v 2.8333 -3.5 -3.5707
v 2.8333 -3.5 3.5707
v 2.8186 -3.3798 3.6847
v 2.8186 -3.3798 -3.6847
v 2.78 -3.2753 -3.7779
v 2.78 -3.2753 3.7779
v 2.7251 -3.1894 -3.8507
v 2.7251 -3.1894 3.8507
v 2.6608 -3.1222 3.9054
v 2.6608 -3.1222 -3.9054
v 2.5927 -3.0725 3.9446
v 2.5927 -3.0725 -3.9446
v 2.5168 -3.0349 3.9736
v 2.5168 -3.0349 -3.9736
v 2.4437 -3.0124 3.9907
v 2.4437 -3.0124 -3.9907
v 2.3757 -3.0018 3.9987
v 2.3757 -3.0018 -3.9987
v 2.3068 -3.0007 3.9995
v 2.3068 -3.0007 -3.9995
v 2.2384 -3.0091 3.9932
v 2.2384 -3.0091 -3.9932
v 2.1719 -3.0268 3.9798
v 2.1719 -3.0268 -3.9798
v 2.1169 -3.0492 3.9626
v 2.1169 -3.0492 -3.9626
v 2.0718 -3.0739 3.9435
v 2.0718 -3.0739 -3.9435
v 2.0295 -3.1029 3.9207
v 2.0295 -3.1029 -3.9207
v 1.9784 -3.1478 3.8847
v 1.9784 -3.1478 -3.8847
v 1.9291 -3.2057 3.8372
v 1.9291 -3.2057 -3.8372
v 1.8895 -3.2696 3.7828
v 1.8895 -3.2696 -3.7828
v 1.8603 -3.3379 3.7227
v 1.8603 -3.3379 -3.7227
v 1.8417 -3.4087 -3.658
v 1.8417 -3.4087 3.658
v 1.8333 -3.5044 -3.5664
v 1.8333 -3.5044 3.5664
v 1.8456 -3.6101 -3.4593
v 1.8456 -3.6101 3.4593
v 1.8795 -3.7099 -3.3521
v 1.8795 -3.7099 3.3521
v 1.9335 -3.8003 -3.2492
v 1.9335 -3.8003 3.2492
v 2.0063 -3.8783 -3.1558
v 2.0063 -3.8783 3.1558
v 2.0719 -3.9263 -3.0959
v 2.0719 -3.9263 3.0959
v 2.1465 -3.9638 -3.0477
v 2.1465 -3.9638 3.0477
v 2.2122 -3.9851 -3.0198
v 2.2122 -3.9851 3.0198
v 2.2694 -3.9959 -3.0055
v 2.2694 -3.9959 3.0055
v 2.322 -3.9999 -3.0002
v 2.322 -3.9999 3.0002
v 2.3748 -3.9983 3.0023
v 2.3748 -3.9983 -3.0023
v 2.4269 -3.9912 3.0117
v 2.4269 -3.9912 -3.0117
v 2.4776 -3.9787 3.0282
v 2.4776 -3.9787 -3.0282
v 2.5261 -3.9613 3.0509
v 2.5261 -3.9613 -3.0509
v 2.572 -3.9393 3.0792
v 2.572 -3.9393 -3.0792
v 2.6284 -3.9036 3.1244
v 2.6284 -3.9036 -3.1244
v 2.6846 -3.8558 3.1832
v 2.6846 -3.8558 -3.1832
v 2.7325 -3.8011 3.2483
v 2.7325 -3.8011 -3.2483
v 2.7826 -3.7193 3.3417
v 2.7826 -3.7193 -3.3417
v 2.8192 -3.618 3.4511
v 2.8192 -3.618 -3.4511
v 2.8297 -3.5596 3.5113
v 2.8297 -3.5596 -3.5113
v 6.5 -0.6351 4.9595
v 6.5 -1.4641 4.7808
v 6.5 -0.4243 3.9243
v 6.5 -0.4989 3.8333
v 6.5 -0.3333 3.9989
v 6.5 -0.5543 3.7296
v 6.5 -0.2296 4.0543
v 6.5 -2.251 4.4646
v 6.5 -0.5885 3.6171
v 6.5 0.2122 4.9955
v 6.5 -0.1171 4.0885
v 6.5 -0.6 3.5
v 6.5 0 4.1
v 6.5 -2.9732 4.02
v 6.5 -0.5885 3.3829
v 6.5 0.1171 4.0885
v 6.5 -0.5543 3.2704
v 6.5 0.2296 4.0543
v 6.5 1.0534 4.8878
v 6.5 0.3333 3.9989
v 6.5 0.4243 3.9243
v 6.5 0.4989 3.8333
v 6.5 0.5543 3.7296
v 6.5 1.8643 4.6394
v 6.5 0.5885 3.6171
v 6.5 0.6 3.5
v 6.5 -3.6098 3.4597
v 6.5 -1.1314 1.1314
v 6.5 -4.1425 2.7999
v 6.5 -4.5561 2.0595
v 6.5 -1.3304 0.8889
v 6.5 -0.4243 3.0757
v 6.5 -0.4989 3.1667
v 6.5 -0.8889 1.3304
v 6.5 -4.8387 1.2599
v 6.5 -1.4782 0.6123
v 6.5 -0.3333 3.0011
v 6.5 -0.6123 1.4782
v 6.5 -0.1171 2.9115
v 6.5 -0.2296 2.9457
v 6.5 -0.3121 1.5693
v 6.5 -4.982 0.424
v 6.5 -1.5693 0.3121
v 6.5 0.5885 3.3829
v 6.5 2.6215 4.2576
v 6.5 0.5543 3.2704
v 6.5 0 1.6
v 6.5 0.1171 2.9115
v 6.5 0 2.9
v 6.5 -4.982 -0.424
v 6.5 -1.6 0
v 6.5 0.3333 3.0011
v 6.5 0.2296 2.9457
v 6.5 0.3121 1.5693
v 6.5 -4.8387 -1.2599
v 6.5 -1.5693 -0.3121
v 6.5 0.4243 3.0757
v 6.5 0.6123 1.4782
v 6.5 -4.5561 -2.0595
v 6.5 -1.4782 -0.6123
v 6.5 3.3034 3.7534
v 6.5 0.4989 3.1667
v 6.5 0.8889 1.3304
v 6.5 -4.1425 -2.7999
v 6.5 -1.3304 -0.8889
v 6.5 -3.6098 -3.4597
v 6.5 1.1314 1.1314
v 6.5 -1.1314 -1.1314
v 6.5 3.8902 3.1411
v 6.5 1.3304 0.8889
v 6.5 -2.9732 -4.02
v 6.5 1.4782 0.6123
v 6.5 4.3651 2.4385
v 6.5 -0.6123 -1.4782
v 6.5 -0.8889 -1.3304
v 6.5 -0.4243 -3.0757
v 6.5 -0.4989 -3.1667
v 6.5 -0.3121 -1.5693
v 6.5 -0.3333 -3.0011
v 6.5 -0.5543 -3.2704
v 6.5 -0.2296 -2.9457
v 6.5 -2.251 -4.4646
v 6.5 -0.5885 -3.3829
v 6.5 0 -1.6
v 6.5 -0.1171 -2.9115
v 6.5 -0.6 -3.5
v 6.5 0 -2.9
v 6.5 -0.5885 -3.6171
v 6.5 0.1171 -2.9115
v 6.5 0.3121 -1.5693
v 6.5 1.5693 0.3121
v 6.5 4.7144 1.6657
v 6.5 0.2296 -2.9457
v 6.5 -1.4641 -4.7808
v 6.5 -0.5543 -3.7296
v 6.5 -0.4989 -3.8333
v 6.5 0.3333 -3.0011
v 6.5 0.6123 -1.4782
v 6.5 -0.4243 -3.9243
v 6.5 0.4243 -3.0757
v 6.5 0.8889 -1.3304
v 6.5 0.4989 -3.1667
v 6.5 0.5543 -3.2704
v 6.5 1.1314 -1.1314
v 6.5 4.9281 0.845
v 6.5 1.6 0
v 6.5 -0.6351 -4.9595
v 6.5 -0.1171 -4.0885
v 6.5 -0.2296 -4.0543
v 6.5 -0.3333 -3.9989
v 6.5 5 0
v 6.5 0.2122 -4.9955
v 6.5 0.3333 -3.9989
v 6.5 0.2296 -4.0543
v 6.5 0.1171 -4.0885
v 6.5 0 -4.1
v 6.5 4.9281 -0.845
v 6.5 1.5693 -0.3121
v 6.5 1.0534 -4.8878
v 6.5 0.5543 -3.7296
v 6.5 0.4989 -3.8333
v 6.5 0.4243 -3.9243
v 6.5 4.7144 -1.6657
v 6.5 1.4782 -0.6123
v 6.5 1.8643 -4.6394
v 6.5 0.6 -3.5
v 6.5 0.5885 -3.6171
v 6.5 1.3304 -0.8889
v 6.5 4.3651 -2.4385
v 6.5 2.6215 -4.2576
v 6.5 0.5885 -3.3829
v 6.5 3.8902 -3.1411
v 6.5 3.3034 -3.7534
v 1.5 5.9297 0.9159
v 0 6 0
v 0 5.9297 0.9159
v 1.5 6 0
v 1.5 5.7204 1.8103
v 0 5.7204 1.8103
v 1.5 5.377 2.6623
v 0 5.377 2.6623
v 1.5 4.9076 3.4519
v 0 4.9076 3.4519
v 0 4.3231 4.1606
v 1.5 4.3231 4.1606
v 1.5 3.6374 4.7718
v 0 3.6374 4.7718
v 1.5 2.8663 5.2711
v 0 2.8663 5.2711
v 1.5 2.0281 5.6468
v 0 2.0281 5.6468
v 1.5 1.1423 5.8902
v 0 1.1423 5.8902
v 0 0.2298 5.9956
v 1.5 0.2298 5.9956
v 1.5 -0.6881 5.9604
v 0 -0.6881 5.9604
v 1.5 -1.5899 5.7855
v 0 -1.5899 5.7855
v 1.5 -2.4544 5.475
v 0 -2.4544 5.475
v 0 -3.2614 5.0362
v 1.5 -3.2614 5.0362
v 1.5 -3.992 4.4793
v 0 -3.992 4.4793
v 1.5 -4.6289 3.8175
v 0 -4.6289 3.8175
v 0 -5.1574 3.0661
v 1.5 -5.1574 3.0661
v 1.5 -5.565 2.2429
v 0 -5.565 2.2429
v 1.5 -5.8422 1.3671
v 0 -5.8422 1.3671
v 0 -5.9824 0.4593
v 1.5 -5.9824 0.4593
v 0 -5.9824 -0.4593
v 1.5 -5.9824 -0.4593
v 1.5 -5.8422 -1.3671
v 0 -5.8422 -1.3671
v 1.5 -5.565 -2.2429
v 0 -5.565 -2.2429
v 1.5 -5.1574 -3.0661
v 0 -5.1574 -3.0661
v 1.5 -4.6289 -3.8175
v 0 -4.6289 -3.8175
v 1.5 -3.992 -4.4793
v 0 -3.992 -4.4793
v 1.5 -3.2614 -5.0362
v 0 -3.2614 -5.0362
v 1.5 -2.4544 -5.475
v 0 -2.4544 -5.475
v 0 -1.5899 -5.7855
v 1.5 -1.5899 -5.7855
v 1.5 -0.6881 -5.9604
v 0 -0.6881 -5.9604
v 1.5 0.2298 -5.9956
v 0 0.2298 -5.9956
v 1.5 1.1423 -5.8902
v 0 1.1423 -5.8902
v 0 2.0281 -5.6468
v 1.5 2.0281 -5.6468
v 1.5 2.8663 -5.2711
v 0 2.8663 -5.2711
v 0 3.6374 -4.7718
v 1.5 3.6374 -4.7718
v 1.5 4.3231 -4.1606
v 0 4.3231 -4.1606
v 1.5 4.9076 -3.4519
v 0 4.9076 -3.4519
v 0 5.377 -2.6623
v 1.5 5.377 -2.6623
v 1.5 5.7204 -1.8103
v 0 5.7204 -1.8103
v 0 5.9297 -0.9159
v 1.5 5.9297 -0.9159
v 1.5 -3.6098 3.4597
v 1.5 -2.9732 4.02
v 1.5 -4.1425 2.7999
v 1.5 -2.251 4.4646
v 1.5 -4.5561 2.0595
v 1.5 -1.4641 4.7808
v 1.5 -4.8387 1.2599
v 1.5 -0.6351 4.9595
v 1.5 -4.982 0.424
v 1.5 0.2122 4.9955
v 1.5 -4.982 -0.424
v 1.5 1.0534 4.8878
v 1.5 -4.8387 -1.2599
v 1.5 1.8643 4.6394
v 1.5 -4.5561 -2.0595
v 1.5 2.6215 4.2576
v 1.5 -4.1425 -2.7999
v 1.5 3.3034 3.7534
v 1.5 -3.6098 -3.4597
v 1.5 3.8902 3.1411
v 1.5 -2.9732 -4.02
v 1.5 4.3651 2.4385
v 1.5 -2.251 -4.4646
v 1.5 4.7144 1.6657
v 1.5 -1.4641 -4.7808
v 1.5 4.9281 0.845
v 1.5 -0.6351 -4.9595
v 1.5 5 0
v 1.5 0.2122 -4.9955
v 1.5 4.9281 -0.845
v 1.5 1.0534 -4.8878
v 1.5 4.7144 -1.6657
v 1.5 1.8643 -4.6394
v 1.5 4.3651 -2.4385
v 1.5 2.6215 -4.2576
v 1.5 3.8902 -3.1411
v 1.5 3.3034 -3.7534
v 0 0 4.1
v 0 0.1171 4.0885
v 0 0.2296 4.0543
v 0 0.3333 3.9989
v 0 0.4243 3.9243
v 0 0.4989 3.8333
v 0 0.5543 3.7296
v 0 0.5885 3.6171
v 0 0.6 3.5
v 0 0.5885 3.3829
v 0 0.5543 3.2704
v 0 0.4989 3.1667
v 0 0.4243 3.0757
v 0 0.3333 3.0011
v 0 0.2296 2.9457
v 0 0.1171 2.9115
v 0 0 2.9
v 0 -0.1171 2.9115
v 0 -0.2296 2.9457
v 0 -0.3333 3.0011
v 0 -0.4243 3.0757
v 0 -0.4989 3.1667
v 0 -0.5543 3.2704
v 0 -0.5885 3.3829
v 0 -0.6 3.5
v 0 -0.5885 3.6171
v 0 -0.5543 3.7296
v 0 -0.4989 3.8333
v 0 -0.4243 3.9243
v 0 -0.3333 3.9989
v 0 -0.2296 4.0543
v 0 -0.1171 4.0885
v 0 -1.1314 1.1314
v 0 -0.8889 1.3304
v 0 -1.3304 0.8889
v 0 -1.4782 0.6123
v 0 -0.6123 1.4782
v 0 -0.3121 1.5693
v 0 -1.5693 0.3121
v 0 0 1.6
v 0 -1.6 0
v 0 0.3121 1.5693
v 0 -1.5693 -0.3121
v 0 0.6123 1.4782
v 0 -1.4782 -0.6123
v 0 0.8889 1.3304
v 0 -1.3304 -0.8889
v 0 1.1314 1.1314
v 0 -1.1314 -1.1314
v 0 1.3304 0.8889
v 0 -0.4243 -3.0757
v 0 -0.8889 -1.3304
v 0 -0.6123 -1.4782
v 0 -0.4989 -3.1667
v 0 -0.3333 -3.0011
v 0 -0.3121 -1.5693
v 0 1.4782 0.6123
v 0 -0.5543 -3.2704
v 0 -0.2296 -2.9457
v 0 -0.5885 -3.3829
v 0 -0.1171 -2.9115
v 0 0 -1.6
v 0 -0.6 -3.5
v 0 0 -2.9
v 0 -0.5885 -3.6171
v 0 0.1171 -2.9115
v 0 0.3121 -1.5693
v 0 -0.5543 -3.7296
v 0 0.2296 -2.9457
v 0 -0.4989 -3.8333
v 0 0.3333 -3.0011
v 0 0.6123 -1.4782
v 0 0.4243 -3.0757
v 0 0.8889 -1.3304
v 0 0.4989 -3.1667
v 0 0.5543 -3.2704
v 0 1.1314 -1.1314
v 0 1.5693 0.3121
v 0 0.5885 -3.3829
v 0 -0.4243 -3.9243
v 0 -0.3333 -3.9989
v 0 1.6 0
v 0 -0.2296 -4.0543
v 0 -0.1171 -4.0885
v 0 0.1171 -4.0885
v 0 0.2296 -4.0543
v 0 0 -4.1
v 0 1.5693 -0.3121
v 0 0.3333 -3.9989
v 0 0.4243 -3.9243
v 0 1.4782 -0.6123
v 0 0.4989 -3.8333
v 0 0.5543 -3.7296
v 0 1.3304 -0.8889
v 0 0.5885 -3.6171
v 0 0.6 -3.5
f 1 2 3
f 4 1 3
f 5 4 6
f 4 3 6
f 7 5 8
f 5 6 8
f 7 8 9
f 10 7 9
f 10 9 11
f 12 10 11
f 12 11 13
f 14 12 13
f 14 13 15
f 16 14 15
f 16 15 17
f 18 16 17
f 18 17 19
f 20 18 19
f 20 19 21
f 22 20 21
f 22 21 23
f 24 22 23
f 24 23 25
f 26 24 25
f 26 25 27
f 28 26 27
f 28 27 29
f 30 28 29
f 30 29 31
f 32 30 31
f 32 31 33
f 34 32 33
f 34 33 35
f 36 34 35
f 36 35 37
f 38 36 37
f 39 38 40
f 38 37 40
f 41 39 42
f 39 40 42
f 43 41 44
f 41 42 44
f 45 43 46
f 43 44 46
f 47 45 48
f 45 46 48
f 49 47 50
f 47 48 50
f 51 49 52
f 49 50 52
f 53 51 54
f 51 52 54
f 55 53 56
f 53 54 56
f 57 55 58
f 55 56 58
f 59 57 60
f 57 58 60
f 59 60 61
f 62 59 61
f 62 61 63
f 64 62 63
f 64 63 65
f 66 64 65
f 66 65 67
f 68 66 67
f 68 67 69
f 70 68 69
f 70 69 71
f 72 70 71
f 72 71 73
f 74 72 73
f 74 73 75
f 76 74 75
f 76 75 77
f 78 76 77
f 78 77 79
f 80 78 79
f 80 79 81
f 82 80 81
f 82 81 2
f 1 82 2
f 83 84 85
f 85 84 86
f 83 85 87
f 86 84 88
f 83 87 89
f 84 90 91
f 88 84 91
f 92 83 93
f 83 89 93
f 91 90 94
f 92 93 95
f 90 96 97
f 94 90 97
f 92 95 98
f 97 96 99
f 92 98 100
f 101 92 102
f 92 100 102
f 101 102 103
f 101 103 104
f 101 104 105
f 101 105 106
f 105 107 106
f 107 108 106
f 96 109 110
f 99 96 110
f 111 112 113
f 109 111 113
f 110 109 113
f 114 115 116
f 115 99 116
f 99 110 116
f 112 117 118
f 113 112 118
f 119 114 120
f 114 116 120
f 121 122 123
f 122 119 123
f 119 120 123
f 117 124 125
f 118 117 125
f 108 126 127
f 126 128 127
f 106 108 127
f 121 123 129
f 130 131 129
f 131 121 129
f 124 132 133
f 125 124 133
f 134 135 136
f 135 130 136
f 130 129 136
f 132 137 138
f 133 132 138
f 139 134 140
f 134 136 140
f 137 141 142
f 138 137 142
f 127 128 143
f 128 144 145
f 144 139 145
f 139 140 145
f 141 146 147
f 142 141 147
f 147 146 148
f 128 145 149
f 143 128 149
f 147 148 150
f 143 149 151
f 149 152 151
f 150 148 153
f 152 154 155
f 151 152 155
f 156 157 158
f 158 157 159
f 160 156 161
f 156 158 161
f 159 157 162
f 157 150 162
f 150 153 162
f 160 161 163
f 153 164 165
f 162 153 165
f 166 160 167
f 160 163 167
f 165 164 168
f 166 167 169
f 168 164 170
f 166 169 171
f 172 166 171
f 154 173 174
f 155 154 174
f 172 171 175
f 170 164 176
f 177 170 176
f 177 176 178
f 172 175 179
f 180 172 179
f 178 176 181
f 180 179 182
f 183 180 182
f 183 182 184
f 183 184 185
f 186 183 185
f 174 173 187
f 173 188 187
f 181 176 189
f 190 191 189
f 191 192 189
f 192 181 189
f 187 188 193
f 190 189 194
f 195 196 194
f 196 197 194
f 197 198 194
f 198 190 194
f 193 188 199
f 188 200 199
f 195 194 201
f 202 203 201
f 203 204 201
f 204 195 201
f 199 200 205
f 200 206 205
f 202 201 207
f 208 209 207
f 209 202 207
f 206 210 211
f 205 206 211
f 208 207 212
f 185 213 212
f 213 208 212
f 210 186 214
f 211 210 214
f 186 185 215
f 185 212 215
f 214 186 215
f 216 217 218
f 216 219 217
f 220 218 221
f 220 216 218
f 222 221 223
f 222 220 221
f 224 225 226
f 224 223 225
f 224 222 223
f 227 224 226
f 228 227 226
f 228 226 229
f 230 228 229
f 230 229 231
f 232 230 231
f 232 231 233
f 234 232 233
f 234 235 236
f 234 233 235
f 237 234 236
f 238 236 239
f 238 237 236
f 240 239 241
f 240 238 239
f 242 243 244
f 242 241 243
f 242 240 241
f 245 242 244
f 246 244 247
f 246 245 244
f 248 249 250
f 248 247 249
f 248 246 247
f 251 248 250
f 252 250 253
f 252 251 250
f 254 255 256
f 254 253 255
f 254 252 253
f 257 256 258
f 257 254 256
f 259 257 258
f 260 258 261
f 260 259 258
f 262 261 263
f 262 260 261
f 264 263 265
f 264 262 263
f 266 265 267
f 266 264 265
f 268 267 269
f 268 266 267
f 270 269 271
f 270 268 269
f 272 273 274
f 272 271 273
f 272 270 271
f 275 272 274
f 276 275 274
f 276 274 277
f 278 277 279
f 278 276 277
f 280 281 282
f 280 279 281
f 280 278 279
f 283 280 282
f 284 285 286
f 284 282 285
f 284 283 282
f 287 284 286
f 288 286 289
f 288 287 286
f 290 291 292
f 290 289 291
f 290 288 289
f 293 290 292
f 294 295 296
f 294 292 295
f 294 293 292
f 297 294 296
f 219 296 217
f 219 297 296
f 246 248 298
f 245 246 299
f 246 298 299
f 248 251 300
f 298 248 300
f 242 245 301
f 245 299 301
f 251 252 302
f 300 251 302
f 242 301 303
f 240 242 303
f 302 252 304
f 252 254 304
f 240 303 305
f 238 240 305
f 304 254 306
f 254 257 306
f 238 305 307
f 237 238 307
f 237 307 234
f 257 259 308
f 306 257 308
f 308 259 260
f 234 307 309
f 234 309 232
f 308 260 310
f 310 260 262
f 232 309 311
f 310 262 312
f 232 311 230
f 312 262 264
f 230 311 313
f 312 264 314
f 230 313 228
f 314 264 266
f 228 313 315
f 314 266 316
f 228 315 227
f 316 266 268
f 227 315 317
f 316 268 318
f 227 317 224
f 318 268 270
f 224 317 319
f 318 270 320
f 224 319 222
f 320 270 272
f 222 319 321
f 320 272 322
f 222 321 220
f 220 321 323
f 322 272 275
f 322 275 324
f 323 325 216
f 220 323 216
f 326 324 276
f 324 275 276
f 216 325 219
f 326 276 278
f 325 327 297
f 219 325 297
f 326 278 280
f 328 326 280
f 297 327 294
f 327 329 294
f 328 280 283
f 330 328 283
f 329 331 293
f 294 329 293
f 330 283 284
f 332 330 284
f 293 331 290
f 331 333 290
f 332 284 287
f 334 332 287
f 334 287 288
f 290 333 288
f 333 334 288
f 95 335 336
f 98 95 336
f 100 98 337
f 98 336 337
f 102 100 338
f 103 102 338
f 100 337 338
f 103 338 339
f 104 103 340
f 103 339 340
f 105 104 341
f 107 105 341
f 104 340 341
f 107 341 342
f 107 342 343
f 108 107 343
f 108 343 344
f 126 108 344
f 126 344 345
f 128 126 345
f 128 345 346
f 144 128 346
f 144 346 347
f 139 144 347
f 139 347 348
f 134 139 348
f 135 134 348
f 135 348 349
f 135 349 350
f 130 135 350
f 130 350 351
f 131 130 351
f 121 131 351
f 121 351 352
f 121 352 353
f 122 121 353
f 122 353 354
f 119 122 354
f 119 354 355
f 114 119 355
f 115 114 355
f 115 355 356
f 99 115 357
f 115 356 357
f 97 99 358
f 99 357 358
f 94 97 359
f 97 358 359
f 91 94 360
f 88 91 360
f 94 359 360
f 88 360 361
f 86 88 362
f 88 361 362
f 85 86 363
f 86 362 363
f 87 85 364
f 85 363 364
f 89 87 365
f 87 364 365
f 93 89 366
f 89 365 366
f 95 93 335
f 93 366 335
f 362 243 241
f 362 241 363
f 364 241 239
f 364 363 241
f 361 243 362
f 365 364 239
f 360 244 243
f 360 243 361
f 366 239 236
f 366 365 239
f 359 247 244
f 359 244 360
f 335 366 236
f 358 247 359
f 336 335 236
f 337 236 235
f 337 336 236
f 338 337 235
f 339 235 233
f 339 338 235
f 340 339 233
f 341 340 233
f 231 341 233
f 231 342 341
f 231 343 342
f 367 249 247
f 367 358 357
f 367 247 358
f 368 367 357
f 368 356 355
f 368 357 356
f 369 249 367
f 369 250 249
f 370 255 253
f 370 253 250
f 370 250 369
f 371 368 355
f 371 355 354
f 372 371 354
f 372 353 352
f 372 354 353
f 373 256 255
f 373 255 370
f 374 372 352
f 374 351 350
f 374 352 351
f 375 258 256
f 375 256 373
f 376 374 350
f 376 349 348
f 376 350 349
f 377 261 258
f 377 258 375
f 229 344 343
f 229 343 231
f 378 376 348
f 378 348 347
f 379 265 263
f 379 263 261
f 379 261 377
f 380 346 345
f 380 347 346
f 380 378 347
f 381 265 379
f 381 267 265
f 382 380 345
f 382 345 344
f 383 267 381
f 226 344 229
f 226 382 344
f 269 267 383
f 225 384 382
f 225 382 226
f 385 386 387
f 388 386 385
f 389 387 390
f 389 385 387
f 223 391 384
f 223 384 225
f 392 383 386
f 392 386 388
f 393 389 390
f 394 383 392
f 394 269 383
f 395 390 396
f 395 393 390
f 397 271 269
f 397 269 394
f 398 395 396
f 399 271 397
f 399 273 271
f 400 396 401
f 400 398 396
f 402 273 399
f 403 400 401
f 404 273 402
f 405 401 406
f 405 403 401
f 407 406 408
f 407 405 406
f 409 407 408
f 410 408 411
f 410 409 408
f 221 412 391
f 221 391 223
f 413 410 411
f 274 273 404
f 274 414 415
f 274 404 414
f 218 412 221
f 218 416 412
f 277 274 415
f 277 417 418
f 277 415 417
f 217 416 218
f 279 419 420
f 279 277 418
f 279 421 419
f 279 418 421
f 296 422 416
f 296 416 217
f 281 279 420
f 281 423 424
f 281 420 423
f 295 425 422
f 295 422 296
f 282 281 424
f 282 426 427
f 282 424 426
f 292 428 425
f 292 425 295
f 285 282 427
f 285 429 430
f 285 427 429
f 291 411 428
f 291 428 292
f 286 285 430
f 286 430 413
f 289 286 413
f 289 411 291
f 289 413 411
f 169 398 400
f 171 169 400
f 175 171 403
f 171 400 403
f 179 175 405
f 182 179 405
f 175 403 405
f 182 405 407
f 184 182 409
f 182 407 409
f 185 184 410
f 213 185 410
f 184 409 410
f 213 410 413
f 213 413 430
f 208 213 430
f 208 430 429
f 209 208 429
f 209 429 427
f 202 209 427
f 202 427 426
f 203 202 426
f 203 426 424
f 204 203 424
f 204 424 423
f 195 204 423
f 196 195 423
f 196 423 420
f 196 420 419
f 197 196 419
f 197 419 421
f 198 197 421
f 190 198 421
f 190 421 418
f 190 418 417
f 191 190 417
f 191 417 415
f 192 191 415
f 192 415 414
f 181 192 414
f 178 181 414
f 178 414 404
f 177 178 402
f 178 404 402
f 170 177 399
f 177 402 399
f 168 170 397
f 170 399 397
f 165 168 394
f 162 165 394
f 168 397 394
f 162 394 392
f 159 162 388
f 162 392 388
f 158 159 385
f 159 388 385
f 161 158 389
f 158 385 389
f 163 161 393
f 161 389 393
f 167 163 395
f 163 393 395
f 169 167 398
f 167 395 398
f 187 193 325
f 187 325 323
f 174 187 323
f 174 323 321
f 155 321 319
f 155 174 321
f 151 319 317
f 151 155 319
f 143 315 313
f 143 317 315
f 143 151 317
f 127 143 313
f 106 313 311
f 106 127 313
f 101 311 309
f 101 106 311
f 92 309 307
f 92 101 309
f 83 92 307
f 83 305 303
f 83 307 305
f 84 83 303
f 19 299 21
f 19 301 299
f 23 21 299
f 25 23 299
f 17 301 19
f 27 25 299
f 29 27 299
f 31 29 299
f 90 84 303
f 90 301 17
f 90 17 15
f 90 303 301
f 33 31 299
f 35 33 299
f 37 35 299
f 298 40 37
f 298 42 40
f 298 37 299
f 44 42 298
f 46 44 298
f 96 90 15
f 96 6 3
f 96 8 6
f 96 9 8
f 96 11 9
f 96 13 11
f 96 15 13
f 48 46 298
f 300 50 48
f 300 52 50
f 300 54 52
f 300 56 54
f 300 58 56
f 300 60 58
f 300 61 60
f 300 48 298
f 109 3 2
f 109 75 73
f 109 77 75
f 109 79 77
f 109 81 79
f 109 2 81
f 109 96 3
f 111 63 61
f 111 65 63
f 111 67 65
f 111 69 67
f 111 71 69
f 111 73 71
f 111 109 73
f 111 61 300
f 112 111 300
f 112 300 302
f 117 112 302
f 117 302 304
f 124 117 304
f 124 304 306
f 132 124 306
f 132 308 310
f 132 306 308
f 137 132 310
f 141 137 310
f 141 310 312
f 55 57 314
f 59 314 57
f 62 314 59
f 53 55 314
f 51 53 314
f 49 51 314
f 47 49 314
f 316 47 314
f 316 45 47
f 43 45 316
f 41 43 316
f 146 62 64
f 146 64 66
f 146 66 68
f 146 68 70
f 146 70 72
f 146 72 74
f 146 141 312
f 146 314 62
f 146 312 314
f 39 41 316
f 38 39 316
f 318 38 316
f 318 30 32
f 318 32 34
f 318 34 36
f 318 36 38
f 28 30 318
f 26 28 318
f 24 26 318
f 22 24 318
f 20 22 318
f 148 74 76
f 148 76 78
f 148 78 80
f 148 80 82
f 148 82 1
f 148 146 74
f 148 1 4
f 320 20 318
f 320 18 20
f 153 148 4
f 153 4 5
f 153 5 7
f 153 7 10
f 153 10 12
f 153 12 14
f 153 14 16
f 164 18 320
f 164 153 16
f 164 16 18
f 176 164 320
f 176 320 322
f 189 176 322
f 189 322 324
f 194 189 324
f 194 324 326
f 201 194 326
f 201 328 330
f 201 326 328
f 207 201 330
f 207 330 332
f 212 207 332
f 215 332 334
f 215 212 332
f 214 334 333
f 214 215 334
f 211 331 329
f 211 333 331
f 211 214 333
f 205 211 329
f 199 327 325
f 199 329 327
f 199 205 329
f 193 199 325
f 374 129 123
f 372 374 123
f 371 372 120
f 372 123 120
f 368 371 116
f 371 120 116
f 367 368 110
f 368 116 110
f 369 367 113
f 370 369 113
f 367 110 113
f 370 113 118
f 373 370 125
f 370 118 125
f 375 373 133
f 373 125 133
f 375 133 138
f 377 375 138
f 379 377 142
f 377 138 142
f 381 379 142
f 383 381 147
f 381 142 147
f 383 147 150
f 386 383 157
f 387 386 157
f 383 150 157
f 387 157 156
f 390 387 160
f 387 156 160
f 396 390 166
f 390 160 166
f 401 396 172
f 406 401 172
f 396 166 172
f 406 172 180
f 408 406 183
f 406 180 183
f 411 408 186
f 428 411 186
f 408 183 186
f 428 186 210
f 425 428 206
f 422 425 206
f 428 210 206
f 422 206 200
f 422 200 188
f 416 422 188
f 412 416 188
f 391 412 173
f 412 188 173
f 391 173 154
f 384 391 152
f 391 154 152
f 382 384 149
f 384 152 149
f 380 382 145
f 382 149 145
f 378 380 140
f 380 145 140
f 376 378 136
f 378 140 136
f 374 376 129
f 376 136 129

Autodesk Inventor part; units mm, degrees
ref_plane "YZ Plane" through (0, 0, 0) normal (1, 0, 0) x (0, 1, 0)
ref_plane "XZ Plane" through (0, 0, 0) normal (0, 1, 0) x (-1, 0, 0)
ref_plane "XY Plane" through (0, 0, 0) normal (0, 0, 1) x (1, 0, 0)
sketch "Sketch1" plane through (0, 0, 0) normal (0, 0, 1) x (1, 0, 0)
  line L0 (0, 0) -> (0, 6)
  line L1 (0, 6) -> (1.5, 6)
  line L2 (1.5, 6) -> (1.5, 5)
  line L3 (1.5, 5) -> (6.5, 5)
  line L4 (6.5, 5) -> (6.5, 0)
  line L5 (6.5, 0) -> (0, 0)
  dimension "d0" = 10
  dimension "d1" = 12
  dimension "d2" = 1.5
  dimension "d17" = 5
revolve "Revolution1" add sketch "Sketch1" angle 360 about axis through (6.5, 0, 0) along (-1, 0, 0)
sketch "Sketch2" plane through (0, 0, 0) normal (-1, 0, 0) x (0, 0, 1)
  circle A0 centre (0, 0) radius 6 projected
  circle A1 centre (-3.5, 0) radius 0.6
  circle A2 centre (3.5, 0) radius 0.6
  line L0 (-3.5, 0) -> (3.5, 0) construction
  circle A3 centre (0, 0) radius 3.5 construction
  circle A4 centre (0, 0) radius 5 construction
  point P0 (0, 0)
  dimension "d6" = 7
  dimension "d5" = 1.2
  dimension "d7" = 10
extrude "Extrusion1" cut sketch "Sketch2" against normal through all contours A1 | A2
hole "Hole1" at (0, 0, 0) direction (1, 0, 0) diameter 3.2 depth 25 clearance for "Zylinderschraube mit Schlitz DIN 84" size "M3" standard "DIN"
sketch "Sketch3" plane through (0, 0, 0) normal (0, 0, 1) x (1, 0, 0)
  circle A0 centre (2.3333, -3.5) radius 0.5
  line L0 (1.5, -5) -> (6.5, -5) construction
  line L1 (1.5, 5) -> (6.5, 5) construction
  line L2 (-1.3, 0) -> (7.8, 0) construction
  line L3 (1.5, -5) -> (6.5, -5) construction
  line L4 (4, -5) -> (4, 5) construction
  line L5 (1.5, 5) -> (6.5, 5) construction
  point P0 (0, 0)
  dimension "d18" = 1
  dimension "d19" = 3.5
  dimension "d22" = 2.5
  dimension "d23" = 1.6667
extrude "Extrusion2" cut sketch "Sketch3" along normal through all both and the other way through all
equation "\"d23\" = 0.666667 * d22"
properties part number "Capston_Tensioning"
